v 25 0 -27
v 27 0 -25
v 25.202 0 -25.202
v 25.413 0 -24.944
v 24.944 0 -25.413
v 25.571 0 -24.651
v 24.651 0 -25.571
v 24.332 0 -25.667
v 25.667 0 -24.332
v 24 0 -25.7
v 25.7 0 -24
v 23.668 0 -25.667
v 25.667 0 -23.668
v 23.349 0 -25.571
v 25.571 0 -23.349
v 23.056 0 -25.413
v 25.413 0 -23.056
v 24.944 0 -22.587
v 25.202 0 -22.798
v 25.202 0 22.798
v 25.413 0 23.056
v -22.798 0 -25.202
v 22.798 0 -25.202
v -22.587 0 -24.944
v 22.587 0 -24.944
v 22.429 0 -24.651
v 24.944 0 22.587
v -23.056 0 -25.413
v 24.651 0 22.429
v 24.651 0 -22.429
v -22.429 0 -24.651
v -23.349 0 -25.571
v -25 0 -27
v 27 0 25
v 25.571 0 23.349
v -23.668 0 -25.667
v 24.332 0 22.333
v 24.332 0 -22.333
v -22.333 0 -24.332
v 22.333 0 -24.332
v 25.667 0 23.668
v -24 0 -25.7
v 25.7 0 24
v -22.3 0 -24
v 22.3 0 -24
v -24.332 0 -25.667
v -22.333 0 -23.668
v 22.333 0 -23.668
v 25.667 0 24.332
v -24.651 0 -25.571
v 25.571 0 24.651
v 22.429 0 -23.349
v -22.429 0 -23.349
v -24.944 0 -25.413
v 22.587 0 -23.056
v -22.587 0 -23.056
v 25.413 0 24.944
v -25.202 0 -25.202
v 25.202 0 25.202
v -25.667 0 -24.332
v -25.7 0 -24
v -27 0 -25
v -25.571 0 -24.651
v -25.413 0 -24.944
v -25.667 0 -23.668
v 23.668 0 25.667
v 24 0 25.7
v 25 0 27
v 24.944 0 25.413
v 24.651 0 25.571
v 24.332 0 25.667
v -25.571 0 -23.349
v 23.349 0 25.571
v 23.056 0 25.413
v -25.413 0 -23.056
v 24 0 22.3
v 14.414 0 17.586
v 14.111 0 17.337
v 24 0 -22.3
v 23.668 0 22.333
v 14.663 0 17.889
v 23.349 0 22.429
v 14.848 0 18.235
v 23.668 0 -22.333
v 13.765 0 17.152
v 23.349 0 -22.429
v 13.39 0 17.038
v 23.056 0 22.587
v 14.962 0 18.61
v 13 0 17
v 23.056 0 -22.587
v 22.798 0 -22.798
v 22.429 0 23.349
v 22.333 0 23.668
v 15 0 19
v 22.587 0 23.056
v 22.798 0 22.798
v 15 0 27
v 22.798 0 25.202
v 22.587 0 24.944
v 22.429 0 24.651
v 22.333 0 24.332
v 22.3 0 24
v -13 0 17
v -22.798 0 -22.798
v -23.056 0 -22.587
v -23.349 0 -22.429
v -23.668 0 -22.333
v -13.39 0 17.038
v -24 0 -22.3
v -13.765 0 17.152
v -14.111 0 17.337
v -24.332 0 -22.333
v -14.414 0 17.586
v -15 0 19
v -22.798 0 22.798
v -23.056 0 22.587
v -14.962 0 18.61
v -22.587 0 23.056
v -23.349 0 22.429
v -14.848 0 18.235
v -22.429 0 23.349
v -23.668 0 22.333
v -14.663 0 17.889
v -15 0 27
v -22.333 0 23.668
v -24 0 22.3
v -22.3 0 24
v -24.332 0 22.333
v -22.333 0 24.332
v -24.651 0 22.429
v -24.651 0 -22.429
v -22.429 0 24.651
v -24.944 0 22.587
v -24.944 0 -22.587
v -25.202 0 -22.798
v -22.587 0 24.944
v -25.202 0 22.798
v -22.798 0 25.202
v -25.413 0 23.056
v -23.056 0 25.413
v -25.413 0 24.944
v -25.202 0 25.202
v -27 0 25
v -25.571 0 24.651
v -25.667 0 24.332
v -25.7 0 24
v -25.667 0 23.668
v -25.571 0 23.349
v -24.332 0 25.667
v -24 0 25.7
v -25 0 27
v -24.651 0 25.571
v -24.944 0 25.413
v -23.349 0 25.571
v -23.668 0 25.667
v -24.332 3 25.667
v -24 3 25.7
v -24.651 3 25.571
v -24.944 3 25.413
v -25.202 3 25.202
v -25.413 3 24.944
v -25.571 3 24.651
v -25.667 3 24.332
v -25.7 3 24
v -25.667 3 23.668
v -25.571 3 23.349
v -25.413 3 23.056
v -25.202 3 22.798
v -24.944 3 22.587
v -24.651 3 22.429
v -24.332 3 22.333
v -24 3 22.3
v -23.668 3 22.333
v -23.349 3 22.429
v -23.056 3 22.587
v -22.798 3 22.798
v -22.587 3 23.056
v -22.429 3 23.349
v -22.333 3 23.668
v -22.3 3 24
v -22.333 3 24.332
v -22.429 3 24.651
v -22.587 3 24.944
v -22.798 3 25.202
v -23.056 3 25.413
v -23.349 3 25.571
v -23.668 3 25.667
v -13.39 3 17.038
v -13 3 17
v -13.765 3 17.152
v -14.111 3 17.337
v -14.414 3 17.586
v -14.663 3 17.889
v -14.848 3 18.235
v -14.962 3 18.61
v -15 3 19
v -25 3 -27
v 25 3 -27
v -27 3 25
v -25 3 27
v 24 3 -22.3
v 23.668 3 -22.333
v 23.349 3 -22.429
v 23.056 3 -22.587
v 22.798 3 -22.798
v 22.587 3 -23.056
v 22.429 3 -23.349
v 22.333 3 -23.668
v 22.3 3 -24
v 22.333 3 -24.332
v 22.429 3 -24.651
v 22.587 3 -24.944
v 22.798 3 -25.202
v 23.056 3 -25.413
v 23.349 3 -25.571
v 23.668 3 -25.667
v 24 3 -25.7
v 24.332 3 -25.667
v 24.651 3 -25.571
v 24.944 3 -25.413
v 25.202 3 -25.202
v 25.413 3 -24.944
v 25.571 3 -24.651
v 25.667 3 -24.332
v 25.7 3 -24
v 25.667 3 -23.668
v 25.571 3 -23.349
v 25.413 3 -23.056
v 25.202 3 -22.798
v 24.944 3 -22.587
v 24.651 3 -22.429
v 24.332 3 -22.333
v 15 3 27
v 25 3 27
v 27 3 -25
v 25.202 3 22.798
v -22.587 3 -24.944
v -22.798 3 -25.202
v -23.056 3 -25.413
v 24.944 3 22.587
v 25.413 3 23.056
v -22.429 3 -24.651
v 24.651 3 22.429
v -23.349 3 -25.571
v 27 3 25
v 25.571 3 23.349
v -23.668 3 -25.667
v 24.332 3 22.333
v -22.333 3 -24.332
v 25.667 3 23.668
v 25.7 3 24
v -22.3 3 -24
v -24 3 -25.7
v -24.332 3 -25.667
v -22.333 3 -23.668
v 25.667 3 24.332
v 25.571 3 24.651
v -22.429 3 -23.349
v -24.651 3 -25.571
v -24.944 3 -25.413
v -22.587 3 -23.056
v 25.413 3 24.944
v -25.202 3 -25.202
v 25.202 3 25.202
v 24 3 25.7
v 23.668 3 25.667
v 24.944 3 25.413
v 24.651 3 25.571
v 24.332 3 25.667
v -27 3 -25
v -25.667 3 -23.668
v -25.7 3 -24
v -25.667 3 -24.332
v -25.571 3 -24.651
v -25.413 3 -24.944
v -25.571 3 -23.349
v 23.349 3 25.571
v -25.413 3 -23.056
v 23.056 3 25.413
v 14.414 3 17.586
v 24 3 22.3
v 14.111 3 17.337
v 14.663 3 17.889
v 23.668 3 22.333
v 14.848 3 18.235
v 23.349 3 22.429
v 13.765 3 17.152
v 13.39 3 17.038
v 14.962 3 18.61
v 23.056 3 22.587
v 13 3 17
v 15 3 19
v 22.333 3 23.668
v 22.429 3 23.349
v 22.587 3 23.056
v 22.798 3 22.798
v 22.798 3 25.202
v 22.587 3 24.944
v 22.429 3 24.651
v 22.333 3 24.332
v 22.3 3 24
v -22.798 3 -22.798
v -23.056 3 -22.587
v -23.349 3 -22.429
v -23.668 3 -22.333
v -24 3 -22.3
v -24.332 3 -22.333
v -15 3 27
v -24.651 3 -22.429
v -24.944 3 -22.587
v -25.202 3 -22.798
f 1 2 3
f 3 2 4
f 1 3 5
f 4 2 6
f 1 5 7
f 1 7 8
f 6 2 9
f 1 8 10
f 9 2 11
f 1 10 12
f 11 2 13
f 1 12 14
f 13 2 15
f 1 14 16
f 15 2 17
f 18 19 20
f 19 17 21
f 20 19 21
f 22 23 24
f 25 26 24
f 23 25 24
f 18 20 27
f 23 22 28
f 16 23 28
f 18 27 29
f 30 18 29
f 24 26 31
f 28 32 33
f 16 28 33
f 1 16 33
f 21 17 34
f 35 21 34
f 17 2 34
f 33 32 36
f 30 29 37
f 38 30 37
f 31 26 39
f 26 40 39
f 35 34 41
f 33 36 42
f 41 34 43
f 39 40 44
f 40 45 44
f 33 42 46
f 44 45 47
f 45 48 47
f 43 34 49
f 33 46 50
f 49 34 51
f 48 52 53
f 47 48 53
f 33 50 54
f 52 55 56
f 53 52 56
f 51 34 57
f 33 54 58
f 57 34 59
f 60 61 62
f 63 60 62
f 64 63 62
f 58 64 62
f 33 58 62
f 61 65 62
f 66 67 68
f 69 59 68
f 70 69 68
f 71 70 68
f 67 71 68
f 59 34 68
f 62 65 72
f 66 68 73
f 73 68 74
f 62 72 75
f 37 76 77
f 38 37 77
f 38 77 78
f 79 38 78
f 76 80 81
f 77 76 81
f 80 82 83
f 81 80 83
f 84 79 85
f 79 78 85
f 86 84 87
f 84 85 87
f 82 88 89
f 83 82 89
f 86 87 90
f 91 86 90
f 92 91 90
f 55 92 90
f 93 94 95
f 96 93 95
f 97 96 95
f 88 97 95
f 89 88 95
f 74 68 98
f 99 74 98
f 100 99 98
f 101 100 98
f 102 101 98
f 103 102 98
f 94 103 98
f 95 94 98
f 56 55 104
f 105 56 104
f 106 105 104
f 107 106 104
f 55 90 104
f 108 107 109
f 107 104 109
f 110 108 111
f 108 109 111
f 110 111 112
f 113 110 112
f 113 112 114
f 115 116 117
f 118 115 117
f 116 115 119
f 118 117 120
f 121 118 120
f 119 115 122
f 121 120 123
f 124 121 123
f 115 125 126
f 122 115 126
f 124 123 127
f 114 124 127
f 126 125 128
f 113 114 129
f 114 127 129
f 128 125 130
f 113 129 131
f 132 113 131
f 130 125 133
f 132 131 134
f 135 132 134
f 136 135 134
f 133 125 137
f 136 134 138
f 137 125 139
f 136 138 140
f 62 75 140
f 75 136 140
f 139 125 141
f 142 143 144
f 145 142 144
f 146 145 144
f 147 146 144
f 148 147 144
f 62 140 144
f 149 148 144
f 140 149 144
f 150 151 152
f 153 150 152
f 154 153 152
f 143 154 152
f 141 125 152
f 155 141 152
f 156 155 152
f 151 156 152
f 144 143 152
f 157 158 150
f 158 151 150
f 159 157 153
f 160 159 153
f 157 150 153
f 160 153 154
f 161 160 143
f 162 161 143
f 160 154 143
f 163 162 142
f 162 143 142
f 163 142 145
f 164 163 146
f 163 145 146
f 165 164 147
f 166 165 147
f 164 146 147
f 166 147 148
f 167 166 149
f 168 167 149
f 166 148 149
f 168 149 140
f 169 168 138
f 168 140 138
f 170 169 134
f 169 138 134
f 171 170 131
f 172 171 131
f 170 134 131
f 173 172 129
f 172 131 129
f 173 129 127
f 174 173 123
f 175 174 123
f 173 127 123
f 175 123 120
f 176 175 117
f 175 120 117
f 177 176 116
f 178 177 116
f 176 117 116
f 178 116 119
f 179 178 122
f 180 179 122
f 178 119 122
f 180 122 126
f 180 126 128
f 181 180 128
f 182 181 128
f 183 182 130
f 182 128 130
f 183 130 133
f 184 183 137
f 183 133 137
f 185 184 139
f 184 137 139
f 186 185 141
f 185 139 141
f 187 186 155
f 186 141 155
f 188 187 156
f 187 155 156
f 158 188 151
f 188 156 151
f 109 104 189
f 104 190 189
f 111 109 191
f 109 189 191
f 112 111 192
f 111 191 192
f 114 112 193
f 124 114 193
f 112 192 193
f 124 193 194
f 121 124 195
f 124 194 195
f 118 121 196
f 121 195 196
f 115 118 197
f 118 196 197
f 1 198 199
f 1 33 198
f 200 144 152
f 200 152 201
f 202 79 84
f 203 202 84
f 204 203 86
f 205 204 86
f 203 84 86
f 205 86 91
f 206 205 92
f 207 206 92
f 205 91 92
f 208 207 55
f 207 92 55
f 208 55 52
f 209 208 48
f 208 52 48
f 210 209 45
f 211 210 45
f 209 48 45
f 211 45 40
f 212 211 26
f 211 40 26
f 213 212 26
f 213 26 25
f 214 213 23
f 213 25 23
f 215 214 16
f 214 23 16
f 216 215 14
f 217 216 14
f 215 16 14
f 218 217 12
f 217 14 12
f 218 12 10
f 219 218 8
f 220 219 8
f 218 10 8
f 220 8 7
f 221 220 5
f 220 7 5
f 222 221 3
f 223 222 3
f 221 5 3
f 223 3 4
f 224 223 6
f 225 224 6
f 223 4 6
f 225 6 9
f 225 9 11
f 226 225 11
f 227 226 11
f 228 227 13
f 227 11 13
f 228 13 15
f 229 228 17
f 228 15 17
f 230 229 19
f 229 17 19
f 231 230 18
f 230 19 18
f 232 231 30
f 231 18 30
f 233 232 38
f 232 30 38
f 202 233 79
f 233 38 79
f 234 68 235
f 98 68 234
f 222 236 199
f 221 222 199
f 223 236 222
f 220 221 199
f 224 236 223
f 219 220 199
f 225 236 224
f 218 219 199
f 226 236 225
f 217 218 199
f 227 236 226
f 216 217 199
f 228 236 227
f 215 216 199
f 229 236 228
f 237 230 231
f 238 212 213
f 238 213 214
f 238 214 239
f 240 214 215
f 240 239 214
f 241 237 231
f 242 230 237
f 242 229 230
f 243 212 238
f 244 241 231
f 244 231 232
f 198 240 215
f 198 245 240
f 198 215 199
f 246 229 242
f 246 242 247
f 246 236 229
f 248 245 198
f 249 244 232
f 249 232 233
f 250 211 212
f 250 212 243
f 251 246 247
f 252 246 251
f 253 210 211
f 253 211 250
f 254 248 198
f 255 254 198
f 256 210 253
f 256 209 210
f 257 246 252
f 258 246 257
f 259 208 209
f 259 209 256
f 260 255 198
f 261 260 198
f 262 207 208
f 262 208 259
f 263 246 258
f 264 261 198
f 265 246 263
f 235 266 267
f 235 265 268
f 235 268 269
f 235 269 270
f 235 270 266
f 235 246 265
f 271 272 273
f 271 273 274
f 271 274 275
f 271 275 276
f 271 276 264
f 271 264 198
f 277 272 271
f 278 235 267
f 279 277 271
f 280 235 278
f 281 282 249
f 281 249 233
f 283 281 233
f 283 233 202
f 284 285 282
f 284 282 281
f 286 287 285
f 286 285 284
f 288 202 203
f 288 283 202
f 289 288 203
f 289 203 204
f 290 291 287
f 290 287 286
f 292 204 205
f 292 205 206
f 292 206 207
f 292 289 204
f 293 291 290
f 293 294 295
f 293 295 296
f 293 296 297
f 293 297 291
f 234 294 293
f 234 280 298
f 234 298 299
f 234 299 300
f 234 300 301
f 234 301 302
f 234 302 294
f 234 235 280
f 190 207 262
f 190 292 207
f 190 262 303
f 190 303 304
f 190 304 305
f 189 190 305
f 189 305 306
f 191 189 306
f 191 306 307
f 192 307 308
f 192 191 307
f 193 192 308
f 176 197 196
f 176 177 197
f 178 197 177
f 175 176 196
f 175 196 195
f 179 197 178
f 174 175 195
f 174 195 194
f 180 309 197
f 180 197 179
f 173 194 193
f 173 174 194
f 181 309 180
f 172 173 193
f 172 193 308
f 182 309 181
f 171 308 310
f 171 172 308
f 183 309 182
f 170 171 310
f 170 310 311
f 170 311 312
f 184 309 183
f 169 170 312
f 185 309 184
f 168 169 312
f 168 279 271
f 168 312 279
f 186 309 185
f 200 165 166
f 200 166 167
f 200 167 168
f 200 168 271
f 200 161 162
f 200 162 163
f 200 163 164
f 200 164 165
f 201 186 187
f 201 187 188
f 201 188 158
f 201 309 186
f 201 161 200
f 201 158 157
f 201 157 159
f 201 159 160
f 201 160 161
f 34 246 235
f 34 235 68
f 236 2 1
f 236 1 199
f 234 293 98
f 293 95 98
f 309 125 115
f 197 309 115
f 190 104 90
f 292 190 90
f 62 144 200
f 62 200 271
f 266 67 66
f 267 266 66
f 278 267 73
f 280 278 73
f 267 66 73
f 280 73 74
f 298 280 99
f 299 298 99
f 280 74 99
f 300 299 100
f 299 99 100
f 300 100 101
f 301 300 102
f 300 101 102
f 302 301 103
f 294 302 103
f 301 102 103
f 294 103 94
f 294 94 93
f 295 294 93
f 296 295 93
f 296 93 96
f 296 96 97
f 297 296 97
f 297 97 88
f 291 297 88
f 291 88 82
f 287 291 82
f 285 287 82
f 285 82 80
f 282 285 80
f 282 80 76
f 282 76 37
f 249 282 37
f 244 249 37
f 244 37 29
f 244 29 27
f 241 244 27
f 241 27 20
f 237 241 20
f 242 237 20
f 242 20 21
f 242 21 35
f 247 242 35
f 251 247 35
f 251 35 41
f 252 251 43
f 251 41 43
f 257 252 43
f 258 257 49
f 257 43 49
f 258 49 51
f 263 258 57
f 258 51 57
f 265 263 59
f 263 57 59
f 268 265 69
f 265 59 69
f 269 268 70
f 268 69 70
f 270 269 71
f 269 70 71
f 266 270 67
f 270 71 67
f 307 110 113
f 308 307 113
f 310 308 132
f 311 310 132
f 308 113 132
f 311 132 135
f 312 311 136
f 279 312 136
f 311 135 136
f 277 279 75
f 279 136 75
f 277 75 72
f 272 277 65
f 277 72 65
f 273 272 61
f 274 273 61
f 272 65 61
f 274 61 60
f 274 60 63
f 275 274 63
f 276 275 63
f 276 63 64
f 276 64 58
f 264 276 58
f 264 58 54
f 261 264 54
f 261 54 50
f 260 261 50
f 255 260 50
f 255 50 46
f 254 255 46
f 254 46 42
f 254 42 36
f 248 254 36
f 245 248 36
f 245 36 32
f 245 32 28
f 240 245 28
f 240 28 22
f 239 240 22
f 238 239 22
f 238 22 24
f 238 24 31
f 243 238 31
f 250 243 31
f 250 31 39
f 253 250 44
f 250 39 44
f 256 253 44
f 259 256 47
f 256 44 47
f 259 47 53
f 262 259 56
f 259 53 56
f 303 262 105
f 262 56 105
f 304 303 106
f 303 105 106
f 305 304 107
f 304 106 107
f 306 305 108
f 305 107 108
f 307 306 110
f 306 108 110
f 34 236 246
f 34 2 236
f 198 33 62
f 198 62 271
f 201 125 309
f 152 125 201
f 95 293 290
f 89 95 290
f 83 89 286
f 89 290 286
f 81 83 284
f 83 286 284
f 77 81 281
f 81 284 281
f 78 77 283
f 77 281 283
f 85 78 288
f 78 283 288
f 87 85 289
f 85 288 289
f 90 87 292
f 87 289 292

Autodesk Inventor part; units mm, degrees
ref_plane "YZ Plane" through (0, 0, 0) normal (1, 0, 0) x (0, 1, 0)
ref_plane "XZ Plane" through (0, 0, 0) normal (0, 1, 0) x (-1, 0, 0)
ref_plane "XY Plane" through (0, 0, 0) normal (0, 0, 1) x (1, 0, 0)
sketch "Skizze1" plane through (0, 0, 0) normal (0, 1, 0) x (-1, 0, 0)
  line L0 (-27, 27) -> (27, 27)
  line L1 (27, 27) -> (27, -27)
  line L2 (27, -27) -> (-27, -27)
  line L3 (-27, -27) -> (-27, 27)
  line L4 (-27, 27) -> (27, -27) construction
  line L5 (27, 27) -> (-27, -27) construction
  point P0 (0, 0)
  dimension "d0" = 54
  dimension "d1" = 54
extrude "Extrusion1" add sketch "Skizze1" along normal blind 3
chamfer "Fase1" distance 2 angle 45 4 edges at (27, 1.5, 27) (27, 1.5, -27) (-27, 1.5, 27) (-27, 1.5, -27)
sketch "Skizze2" plane through (0, 3, 0) normal (0, 1, 0) x (1, 0, 0)
  circle A0 centre (0, 0) radius 11
  dimension "d7" = 22
extrude "Extrusion2" [suppressed]
sketch "Skizze4" plane through (0, 3, 0) normal (0, 1, 0) x (1, 0, 0)
  line L0 (-24, -24) -> (24, -24)
  line L1 (24, -24) -> (24, 24)
  line L2 (24, 24) -> (-24, 24)
  line L3 (-24, 24) -> (-24, -24)
  line L4 (-24, -24) -> (24, 24) construction
  line L5 (24, -24) -> (-24, 24) construction
  point P0 (0, 0)
  dimension "d13" = 48
  dimension "d14" = 48
hole "Bohrung1" at (24, 3, -24) at (24, 3, 24) at (-24, 3, 24) at (-24, 3, -24) direction (0, -1, 0) diameter 3.4 end through all clearance for "Inbusschraube ISO 4762" size "M3" standard "ISO"
sketch "Skizze5" plane through (0, 0, 0) normal (0, -1, 0) x (1, 0, 0)
  line L0 (15, 37) -> (-15, 37)
  line L1 (-15, 37) -> (-15, 17)
  line L2 (-15, 17) -> (15, 17)
  line L3 (15, 17) -> (15, 37)
  line L4 (-25, 27) -> (25, 27) projected
  line L5 (15, 37) -> (-15, 17) construction
  line L6 (-15, 37) -> (15, 17) construction
  point P0 (0, 0)
  point P1 (0, 27)
  dimension "d22" = 30
  dimension "d23" = 10
extrude "Extrusion4" cut sketch "Skizze5" against normal blind 3
fillet "Rundung1" radius 2 2 edges at (-15, 1.5, 17) (15, 1.5, 17)
properties part number "bearing_mount_part_1" material "Aluminium 6061"
